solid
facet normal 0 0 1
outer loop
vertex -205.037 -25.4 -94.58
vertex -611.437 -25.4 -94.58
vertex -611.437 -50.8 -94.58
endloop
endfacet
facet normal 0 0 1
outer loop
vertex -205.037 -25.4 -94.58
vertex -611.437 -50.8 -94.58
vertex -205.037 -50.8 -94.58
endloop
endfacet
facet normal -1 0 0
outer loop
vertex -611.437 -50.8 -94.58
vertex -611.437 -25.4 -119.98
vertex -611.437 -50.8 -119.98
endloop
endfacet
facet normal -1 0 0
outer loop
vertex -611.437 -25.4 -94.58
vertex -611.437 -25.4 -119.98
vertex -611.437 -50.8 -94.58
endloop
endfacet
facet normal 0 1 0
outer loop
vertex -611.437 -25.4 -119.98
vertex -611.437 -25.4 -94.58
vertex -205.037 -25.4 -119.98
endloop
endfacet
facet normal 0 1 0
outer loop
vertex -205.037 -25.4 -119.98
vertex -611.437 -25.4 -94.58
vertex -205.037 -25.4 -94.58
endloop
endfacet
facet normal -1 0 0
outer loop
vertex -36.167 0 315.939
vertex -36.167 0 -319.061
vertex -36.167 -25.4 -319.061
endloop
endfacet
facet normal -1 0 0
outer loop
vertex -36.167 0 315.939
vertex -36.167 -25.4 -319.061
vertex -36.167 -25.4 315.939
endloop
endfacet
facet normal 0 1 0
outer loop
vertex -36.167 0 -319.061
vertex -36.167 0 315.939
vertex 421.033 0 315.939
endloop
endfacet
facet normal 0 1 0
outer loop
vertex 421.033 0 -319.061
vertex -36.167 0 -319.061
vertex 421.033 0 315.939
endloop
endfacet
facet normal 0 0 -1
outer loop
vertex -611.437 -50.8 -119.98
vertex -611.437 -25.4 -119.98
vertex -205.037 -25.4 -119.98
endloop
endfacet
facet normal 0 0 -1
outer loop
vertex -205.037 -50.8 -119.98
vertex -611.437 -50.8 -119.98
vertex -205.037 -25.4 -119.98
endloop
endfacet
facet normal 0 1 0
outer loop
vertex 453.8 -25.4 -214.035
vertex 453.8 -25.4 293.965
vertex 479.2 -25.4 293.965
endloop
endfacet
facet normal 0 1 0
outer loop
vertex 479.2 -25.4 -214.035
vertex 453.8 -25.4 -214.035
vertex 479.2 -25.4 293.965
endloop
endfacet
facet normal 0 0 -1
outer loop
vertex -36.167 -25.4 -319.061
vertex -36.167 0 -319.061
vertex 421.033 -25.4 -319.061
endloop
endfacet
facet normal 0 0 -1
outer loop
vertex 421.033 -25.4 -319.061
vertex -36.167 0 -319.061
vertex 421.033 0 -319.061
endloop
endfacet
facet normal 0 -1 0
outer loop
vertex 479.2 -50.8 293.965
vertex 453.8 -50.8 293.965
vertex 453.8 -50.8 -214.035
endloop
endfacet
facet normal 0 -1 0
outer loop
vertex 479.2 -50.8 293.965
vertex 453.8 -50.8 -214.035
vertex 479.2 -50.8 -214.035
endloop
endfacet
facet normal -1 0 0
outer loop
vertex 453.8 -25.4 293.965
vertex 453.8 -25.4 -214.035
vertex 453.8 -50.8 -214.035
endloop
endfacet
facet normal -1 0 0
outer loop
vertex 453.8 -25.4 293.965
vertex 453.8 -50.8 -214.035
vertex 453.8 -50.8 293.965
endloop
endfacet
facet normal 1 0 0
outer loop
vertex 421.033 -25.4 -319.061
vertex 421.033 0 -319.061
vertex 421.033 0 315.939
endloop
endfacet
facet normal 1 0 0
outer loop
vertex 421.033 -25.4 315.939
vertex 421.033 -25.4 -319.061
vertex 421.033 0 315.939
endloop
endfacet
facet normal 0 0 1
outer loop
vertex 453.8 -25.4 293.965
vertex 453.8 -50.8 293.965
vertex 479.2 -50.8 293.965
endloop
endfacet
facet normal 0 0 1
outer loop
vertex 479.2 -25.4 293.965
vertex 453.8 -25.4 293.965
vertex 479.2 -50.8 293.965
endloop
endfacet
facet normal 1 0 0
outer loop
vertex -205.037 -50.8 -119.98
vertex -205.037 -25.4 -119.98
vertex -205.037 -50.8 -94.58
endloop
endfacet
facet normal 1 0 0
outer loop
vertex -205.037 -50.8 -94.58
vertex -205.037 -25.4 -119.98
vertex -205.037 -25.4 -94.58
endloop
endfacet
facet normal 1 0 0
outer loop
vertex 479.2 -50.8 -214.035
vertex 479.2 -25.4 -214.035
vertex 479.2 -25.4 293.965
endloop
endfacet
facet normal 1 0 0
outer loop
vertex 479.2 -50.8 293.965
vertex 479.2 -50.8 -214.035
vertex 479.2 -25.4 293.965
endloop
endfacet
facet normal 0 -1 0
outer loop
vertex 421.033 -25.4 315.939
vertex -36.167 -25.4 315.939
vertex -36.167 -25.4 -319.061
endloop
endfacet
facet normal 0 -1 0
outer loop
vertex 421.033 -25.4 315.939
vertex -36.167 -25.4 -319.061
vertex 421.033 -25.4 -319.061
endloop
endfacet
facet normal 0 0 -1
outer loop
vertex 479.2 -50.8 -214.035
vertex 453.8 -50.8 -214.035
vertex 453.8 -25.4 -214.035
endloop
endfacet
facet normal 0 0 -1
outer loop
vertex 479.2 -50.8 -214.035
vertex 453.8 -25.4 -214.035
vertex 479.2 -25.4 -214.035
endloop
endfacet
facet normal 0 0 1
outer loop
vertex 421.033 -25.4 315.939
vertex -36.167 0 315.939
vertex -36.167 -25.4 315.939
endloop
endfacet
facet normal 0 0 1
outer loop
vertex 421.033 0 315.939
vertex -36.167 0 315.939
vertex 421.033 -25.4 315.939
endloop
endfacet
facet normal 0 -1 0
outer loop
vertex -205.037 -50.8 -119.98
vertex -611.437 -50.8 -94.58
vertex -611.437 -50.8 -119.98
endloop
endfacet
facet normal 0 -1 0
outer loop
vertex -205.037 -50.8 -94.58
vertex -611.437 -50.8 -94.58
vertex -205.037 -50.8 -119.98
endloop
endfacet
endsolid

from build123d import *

# Parameters (mm, degrees)
F0_W     = 457.2
F0_H     = 635
F1_DEPTH = 25.4
F2_W     = 25.4
F2_H     = 508
F3_DEPTH = 25.4
F5_W     = 406.4
F5_H     = 25.4
F6_DEPTH = 25.4


with BuildPart() as f1:
    # F0 (on Front) → F1 (new body)
    with BuildSketch(Plane.XZ):
        with Locations((192.432878, -1.561169)):
            Rectangle(F0_W, F0_H)
    extrude(amount=F1_DEPTH)


with BuildPart() as f3:
    # F2 (on face) → F3 (new body)
    with BuildSketch(Plane.XZ.offset(25.4)):
        with Locations((466.500201, 39.965361)):
            Rectangle(F2_W, F2_H)
    extrude(amount=F3_DEPTH)


with BuildPart() as f6:
    # F5 (on face) → F6 (new body)
    with BuildSketch(Plane.XZ.offset(25.4)):
        with Locations((-408.236938, -107.28032)):
            Rectangle(F5_W, F5_H)
    extrude(amount=F6_DEPTH)


solid = Compound([f1.part, f3.part, f6.part])
